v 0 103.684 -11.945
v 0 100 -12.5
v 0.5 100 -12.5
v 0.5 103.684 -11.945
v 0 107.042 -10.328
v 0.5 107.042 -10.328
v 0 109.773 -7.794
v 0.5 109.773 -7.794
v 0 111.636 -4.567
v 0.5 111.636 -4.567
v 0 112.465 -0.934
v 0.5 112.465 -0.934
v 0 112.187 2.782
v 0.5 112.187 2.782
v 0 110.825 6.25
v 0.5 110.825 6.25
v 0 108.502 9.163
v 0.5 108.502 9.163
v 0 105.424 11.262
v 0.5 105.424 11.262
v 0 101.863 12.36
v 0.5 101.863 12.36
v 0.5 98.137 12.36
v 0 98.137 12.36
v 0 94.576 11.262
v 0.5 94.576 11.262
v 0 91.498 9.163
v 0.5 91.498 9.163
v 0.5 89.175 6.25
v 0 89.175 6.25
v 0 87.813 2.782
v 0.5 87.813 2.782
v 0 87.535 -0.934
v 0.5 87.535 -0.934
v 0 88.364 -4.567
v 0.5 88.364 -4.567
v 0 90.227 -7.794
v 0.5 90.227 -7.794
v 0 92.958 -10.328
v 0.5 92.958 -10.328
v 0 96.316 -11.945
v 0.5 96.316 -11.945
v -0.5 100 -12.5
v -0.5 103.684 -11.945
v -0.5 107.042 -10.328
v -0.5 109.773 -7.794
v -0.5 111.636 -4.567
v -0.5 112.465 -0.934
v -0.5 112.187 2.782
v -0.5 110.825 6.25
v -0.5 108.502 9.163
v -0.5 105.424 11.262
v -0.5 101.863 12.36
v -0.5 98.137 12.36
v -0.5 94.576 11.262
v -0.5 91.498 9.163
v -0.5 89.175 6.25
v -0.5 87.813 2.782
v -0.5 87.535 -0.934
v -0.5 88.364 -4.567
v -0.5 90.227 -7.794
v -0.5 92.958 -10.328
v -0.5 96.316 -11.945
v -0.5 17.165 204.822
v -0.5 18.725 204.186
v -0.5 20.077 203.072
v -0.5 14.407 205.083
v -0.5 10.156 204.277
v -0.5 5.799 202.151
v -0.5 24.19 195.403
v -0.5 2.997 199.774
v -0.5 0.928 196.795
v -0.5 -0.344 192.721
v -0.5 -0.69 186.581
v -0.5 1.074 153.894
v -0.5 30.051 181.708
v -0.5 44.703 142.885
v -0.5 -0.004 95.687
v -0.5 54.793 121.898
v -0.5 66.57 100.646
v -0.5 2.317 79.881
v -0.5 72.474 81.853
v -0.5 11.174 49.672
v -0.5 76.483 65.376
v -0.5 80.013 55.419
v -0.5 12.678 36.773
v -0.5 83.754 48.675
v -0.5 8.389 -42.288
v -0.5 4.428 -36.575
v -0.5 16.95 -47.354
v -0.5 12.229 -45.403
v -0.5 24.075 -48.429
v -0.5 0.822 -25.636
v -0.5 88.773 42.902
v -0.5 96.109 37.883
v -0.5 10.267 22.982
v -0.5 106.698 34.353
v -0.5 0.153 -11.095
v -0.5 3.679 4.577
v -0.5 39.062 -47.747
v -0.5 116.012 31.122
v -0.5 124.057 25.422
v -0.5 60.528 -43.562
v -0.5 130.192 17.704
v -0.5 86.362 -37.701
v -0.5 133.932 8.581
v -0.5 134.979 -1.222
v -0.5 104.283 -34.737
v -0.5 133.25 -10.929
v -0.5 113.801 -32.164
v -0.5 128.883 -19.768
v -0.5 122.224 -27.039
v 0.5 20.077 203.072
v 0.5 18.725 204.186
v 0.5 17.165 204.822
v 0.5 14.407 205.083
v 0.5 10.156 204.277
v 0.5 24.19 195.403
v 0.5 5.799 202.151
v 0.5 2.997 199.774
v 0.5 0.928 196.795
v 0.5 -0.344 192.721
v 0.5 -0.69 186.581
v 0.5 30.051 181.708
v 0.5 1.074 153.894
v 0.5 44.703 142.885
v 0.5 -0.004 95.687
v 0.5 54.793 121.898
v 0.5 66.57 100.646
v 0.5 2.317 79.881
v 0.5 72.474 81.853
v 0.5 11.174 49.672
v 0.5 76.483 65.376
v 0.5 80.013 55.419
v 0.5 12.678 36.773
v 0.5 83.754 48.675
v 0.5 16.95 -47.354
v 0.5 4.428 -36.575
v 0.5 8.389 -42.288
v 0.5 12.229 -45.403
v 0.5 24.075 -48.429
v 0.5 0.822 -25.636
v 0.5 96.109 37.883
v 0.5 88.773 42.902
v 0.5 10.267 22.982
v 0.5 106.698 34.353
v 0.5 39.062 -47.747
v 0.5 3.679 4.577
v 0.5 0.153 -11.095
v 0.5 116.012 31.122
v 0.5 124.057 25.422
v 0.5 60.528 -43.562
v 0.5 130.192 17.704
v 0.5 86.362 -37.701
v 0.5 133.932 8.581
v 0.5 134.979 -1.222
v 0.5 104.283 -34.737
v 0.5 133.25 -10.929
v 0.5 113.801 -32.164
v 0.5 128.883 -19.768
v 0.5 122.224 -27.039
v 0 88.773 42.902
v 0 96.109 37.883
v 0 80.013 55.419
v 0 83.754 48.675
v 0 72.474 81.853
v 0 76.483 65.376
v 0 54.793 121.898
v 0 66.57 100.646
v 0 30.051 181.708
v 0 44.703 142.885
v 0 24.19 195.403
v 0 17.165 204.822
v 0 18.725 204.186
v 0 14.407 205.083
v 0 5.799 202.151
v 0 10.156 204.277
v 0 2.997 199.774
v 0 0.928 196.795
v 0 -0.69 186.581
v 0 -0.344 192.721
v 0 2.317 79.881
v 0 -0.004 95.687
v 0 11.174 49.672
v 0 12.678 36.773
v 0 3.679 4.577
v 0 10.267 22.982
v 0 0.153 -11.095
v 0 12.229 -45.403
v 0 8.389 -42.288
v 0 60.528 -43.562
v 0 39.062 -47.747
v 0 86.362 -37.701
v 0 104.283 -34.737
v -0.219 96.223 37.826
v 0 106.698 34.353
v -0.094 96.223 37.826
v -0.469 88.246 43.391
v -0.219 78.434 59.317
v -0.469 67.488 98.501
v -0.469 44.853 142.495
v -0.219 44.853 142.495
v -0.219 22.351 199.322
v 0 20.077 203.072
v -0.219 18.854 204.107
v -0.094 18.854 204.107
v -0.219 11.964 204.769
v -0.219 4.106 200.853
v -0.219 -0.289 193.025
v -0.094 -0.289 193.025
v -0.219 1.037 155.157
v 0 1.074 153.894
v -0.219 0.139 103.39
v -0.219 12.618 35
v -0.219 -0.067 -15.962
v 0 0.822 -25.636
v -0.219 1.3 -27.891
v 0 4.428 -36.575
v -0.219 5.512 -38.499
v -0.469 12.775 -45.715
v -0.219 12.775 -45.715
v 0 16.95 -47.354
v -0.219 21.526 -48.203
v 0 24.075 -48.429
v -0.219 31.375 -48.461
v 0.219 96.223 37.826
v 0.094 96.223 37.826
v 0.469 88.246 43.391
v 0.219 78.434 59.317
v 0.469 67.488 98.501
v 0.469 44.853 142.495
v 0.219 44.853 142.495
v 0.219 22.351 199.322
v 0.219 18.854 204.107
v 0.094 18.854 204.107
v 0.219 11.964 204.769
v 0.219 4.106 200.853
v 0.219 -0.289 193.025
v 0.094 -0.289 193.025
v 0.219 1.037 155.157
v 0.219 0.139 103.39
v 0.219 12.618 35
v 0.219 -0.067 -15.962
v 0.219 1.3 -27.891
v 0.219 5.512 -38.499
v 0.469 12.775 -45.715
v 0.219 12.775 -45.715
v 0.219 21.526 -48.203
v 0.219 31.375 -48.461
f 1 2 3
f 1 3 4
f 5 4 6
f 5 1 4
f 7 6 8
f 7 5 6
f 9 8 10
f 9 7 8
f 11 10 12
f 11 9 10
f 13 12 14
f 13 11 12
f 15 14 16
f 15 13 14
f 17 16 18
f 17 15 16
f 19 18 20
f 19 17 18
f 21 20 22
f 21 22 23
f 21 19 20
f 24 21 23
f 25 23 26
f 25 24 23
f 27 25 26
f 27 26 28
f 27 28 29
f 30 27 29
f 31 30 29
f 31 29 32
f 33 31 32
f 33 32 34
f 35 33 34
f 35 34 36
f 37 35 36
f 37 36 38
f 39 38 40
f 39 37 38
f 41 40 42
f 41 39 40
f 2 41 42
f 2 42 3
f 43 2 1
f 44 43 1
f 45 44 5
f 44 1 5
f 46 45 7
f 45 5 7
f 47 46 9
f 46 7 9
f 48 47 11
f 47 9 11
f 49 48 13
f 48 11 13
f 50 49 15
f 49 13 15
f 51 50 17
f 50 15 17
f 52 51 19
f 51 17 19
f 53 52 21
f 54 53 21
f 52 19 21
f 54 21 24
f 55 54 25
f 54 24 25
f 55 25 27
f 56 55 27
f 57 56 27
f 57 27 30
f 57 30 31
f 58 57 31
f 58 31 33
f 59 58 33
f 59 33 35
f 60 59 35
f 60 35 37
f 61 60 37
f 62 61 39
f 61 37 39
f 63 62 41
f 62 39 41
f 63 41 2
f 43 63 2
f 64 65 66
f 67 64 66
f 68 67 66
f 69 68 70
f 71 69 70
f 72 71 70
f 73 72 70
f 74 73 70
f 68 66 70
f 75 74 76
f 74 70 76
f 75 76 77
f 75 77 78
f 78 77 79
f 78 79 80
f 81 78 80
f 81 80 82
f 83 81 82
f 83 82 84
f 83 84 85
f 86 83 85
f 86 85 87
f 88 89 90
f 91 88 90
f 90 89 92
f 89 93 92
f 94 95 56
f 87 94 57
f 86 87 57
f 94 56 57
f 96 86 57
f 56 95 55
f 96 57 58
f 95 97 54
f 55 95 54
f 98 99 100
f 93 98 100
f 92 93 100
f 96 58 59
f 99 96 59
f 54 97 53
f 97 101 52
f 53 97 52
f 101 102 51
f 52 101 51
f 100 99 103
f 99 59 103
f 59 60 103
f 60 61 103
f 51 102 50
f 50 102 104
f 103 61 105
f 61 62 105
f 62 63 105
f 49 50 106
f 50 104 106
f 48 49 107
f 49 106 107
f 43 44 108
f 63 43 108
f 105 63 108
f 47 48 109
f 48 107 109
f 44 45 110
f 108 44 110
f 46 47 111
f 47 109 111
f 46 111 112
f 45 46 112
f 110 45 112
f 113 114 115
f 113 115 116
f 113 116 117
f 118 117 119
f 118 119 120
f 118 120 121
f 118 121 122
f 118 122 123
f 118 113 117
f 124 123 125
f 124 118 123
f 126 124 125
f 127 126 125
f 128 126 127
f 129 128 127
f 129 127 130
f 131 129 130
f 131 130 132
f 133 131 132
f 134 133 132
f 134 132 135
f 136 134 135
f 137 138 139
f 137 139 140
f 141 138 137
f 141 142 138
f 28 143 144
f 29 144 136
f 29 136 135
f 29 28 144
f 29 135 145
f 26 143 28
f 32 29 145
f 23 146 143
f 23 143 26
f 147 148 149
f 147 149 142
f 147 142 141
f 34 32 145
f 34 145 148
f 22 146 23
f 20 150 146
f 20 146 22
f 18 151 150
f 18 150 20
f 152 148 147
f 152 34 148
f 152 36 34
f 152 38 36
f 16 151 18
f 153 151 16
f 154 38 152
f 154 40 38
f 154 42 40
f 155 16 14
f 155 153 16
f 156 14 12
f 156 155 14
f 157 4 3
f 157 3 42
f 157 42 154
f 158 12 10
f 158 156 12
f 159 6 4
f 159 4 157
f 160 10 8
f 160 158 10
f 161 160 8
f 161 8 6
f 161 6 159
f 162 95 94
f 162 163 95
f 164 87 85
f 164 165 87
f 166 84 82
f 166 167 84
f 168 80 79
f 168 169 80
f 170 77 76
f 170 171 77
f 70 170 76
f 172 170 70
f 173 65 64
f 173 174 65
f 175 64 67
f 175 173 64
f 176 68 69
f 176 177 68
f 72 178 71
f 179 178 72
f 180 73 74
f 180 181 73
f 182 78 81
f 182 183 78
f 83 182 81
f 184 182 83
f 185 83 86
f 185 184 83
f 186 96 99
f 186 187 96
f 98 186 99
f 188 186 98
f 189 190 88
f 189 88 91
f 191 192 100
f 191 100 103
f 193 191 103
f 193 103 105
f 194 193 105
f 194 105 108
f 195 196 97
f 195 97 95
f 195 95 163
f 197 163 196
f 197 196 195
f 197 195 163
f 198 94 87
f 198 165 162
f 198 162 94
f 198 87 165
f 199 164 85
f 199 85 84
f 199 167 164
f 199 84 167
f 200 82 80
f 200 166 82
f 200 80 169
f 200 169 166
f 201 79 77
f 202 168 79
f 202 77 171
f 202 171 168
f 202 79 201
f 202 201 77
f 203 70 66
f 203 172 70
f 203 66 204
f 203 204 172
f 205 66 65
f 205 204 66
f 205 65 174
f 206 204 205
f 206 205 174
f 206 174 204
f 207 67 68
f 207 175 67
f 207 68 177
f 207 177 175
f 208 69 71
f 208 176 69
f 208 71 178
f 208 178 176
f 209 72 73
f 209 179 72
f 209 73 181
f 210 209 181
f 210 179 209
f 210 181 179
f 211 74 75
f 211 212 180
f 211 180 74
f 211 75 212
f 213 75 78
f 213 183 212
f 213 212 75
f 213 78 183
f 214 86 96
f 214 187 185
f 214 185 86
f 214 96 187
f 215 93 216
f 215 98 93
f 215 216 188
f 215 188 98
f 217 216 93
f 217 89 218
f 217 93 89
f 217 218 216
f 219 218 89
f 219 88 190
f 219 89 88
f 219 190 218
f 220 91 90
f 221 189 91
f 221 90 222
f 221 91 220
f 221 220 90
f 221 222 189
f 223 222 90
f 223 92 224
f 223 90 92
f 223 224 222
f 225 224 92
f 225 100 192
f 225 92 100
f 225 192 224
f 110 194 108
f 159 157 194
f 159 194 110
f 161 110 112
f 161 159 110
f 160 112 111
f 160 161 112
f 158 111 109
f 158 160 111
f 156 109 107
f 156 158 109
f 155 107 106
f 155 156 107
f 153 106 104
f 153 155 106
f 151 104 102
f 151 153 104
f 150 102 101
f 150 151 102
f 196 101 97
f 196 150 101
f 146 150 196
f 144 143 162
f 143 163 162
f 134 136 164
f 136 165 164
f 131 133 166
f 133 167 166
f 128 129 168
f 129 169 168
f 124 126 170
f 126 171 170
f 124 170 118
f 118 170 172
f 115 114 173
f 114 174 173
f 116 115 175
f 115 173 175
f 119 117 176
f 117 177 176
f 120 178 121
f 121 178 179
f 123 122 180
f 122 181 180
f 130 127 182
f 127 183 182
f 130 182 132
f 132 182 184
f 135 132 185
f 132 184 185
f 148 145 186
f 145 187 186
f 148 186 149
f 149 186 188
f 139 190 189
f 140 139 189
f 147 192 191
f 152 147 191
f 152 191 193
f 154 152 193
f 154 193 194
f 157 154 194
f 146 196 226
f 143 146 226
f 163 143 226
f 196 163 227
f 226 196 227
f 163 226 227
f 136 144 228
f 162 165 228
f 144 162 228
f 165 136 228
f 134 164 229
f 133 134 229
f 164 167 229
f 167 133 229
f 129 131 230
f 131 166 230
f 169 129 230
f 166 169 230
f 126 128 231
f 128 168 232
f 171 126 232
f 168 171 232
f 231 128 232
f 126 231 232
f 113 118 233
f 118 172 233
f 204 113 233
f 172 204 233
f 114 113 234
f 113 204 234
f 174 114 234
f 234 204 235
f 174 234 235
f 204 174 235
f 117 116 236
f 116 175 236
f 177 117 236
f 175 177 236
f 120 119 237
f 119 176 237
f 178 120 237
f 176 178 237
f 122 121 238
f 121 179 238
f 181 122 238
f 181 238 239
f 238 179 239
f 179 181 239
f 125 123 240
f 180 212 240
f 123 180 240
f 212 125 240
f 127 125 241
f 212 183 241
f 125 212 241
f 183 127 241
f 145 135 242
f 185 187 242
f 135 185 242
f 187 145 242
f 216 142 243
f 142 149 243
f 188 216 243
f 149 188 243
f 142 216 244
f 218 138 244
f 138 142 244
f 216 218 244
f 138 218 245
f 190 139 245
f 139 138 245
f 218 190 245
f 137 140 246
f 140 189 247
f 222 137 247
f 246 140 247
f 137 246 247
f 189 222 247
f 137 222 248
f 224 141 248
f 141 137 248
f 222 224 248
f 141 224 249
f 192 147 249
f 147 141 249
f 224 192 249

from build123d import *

# Parameters (mm, degrees)
SKETCH3_R      = 12.5
EXTRUDE1_DEPTH = 0.5


with BuildPart() as part:
    # Sketch3 → Extrude1 (new, symmetric)
    with BuildSketch(Plane(origin=(0, 0, 0), x_dir=(0, 0, -1), z_dir=(1, 0, 0))):
        with BuildLine():
            ThreePointArc((34.73691178, 104.283335151), (1.222243483, 134.978652359), (-34.353212623, 106.697520622))
            add(Edge.make_bspline(
                [(-34.353212623, 106.697520622), (-36.338972358, 96.512075849), (-50.948831396, 74.621034336), (-85.726167749, 74.271899833), (-114.840028166, 59.528628021), (-128.722122798, 49.71837198), (-165.298947788, 36.565409182), (-189.653696471, 27.320369224), (-207.902909488, 18.046659206), (-201.423126117, -2.048283715), (-146.593854224, 2.641541989), (-120.144568988, 0.641539371), (-77.992228934, -0.701008571), (-34.701952194, 23.728004024), (4.097875112, -6.357223424), (45.175428135, 4.464602831), (52.106608396, 40.381527834), (38.678563253, 72.343162646), (34.73691178, 104.283335151)],
                knots=[0, 0, 0, 0, 0.054541446, 0.16881351, 0.190561729, 0.262972312, 0.2823531, 0.364988827, 0.379148175, 0.409787233, 0.430597399, 0.566439677, 0.595187436, 0.701094703, 0.796074322, 0.860423876, 0.880816444, 1, 1, 1, 1], degree=3))
        make_face()
        with Locations((0, 100)):
            Circle(SKETCH3_R, mode=Mode.SUBTRACT)
    extrude(amount=EXTRUDE1_DEPTH, both=True)


solid = part.part
